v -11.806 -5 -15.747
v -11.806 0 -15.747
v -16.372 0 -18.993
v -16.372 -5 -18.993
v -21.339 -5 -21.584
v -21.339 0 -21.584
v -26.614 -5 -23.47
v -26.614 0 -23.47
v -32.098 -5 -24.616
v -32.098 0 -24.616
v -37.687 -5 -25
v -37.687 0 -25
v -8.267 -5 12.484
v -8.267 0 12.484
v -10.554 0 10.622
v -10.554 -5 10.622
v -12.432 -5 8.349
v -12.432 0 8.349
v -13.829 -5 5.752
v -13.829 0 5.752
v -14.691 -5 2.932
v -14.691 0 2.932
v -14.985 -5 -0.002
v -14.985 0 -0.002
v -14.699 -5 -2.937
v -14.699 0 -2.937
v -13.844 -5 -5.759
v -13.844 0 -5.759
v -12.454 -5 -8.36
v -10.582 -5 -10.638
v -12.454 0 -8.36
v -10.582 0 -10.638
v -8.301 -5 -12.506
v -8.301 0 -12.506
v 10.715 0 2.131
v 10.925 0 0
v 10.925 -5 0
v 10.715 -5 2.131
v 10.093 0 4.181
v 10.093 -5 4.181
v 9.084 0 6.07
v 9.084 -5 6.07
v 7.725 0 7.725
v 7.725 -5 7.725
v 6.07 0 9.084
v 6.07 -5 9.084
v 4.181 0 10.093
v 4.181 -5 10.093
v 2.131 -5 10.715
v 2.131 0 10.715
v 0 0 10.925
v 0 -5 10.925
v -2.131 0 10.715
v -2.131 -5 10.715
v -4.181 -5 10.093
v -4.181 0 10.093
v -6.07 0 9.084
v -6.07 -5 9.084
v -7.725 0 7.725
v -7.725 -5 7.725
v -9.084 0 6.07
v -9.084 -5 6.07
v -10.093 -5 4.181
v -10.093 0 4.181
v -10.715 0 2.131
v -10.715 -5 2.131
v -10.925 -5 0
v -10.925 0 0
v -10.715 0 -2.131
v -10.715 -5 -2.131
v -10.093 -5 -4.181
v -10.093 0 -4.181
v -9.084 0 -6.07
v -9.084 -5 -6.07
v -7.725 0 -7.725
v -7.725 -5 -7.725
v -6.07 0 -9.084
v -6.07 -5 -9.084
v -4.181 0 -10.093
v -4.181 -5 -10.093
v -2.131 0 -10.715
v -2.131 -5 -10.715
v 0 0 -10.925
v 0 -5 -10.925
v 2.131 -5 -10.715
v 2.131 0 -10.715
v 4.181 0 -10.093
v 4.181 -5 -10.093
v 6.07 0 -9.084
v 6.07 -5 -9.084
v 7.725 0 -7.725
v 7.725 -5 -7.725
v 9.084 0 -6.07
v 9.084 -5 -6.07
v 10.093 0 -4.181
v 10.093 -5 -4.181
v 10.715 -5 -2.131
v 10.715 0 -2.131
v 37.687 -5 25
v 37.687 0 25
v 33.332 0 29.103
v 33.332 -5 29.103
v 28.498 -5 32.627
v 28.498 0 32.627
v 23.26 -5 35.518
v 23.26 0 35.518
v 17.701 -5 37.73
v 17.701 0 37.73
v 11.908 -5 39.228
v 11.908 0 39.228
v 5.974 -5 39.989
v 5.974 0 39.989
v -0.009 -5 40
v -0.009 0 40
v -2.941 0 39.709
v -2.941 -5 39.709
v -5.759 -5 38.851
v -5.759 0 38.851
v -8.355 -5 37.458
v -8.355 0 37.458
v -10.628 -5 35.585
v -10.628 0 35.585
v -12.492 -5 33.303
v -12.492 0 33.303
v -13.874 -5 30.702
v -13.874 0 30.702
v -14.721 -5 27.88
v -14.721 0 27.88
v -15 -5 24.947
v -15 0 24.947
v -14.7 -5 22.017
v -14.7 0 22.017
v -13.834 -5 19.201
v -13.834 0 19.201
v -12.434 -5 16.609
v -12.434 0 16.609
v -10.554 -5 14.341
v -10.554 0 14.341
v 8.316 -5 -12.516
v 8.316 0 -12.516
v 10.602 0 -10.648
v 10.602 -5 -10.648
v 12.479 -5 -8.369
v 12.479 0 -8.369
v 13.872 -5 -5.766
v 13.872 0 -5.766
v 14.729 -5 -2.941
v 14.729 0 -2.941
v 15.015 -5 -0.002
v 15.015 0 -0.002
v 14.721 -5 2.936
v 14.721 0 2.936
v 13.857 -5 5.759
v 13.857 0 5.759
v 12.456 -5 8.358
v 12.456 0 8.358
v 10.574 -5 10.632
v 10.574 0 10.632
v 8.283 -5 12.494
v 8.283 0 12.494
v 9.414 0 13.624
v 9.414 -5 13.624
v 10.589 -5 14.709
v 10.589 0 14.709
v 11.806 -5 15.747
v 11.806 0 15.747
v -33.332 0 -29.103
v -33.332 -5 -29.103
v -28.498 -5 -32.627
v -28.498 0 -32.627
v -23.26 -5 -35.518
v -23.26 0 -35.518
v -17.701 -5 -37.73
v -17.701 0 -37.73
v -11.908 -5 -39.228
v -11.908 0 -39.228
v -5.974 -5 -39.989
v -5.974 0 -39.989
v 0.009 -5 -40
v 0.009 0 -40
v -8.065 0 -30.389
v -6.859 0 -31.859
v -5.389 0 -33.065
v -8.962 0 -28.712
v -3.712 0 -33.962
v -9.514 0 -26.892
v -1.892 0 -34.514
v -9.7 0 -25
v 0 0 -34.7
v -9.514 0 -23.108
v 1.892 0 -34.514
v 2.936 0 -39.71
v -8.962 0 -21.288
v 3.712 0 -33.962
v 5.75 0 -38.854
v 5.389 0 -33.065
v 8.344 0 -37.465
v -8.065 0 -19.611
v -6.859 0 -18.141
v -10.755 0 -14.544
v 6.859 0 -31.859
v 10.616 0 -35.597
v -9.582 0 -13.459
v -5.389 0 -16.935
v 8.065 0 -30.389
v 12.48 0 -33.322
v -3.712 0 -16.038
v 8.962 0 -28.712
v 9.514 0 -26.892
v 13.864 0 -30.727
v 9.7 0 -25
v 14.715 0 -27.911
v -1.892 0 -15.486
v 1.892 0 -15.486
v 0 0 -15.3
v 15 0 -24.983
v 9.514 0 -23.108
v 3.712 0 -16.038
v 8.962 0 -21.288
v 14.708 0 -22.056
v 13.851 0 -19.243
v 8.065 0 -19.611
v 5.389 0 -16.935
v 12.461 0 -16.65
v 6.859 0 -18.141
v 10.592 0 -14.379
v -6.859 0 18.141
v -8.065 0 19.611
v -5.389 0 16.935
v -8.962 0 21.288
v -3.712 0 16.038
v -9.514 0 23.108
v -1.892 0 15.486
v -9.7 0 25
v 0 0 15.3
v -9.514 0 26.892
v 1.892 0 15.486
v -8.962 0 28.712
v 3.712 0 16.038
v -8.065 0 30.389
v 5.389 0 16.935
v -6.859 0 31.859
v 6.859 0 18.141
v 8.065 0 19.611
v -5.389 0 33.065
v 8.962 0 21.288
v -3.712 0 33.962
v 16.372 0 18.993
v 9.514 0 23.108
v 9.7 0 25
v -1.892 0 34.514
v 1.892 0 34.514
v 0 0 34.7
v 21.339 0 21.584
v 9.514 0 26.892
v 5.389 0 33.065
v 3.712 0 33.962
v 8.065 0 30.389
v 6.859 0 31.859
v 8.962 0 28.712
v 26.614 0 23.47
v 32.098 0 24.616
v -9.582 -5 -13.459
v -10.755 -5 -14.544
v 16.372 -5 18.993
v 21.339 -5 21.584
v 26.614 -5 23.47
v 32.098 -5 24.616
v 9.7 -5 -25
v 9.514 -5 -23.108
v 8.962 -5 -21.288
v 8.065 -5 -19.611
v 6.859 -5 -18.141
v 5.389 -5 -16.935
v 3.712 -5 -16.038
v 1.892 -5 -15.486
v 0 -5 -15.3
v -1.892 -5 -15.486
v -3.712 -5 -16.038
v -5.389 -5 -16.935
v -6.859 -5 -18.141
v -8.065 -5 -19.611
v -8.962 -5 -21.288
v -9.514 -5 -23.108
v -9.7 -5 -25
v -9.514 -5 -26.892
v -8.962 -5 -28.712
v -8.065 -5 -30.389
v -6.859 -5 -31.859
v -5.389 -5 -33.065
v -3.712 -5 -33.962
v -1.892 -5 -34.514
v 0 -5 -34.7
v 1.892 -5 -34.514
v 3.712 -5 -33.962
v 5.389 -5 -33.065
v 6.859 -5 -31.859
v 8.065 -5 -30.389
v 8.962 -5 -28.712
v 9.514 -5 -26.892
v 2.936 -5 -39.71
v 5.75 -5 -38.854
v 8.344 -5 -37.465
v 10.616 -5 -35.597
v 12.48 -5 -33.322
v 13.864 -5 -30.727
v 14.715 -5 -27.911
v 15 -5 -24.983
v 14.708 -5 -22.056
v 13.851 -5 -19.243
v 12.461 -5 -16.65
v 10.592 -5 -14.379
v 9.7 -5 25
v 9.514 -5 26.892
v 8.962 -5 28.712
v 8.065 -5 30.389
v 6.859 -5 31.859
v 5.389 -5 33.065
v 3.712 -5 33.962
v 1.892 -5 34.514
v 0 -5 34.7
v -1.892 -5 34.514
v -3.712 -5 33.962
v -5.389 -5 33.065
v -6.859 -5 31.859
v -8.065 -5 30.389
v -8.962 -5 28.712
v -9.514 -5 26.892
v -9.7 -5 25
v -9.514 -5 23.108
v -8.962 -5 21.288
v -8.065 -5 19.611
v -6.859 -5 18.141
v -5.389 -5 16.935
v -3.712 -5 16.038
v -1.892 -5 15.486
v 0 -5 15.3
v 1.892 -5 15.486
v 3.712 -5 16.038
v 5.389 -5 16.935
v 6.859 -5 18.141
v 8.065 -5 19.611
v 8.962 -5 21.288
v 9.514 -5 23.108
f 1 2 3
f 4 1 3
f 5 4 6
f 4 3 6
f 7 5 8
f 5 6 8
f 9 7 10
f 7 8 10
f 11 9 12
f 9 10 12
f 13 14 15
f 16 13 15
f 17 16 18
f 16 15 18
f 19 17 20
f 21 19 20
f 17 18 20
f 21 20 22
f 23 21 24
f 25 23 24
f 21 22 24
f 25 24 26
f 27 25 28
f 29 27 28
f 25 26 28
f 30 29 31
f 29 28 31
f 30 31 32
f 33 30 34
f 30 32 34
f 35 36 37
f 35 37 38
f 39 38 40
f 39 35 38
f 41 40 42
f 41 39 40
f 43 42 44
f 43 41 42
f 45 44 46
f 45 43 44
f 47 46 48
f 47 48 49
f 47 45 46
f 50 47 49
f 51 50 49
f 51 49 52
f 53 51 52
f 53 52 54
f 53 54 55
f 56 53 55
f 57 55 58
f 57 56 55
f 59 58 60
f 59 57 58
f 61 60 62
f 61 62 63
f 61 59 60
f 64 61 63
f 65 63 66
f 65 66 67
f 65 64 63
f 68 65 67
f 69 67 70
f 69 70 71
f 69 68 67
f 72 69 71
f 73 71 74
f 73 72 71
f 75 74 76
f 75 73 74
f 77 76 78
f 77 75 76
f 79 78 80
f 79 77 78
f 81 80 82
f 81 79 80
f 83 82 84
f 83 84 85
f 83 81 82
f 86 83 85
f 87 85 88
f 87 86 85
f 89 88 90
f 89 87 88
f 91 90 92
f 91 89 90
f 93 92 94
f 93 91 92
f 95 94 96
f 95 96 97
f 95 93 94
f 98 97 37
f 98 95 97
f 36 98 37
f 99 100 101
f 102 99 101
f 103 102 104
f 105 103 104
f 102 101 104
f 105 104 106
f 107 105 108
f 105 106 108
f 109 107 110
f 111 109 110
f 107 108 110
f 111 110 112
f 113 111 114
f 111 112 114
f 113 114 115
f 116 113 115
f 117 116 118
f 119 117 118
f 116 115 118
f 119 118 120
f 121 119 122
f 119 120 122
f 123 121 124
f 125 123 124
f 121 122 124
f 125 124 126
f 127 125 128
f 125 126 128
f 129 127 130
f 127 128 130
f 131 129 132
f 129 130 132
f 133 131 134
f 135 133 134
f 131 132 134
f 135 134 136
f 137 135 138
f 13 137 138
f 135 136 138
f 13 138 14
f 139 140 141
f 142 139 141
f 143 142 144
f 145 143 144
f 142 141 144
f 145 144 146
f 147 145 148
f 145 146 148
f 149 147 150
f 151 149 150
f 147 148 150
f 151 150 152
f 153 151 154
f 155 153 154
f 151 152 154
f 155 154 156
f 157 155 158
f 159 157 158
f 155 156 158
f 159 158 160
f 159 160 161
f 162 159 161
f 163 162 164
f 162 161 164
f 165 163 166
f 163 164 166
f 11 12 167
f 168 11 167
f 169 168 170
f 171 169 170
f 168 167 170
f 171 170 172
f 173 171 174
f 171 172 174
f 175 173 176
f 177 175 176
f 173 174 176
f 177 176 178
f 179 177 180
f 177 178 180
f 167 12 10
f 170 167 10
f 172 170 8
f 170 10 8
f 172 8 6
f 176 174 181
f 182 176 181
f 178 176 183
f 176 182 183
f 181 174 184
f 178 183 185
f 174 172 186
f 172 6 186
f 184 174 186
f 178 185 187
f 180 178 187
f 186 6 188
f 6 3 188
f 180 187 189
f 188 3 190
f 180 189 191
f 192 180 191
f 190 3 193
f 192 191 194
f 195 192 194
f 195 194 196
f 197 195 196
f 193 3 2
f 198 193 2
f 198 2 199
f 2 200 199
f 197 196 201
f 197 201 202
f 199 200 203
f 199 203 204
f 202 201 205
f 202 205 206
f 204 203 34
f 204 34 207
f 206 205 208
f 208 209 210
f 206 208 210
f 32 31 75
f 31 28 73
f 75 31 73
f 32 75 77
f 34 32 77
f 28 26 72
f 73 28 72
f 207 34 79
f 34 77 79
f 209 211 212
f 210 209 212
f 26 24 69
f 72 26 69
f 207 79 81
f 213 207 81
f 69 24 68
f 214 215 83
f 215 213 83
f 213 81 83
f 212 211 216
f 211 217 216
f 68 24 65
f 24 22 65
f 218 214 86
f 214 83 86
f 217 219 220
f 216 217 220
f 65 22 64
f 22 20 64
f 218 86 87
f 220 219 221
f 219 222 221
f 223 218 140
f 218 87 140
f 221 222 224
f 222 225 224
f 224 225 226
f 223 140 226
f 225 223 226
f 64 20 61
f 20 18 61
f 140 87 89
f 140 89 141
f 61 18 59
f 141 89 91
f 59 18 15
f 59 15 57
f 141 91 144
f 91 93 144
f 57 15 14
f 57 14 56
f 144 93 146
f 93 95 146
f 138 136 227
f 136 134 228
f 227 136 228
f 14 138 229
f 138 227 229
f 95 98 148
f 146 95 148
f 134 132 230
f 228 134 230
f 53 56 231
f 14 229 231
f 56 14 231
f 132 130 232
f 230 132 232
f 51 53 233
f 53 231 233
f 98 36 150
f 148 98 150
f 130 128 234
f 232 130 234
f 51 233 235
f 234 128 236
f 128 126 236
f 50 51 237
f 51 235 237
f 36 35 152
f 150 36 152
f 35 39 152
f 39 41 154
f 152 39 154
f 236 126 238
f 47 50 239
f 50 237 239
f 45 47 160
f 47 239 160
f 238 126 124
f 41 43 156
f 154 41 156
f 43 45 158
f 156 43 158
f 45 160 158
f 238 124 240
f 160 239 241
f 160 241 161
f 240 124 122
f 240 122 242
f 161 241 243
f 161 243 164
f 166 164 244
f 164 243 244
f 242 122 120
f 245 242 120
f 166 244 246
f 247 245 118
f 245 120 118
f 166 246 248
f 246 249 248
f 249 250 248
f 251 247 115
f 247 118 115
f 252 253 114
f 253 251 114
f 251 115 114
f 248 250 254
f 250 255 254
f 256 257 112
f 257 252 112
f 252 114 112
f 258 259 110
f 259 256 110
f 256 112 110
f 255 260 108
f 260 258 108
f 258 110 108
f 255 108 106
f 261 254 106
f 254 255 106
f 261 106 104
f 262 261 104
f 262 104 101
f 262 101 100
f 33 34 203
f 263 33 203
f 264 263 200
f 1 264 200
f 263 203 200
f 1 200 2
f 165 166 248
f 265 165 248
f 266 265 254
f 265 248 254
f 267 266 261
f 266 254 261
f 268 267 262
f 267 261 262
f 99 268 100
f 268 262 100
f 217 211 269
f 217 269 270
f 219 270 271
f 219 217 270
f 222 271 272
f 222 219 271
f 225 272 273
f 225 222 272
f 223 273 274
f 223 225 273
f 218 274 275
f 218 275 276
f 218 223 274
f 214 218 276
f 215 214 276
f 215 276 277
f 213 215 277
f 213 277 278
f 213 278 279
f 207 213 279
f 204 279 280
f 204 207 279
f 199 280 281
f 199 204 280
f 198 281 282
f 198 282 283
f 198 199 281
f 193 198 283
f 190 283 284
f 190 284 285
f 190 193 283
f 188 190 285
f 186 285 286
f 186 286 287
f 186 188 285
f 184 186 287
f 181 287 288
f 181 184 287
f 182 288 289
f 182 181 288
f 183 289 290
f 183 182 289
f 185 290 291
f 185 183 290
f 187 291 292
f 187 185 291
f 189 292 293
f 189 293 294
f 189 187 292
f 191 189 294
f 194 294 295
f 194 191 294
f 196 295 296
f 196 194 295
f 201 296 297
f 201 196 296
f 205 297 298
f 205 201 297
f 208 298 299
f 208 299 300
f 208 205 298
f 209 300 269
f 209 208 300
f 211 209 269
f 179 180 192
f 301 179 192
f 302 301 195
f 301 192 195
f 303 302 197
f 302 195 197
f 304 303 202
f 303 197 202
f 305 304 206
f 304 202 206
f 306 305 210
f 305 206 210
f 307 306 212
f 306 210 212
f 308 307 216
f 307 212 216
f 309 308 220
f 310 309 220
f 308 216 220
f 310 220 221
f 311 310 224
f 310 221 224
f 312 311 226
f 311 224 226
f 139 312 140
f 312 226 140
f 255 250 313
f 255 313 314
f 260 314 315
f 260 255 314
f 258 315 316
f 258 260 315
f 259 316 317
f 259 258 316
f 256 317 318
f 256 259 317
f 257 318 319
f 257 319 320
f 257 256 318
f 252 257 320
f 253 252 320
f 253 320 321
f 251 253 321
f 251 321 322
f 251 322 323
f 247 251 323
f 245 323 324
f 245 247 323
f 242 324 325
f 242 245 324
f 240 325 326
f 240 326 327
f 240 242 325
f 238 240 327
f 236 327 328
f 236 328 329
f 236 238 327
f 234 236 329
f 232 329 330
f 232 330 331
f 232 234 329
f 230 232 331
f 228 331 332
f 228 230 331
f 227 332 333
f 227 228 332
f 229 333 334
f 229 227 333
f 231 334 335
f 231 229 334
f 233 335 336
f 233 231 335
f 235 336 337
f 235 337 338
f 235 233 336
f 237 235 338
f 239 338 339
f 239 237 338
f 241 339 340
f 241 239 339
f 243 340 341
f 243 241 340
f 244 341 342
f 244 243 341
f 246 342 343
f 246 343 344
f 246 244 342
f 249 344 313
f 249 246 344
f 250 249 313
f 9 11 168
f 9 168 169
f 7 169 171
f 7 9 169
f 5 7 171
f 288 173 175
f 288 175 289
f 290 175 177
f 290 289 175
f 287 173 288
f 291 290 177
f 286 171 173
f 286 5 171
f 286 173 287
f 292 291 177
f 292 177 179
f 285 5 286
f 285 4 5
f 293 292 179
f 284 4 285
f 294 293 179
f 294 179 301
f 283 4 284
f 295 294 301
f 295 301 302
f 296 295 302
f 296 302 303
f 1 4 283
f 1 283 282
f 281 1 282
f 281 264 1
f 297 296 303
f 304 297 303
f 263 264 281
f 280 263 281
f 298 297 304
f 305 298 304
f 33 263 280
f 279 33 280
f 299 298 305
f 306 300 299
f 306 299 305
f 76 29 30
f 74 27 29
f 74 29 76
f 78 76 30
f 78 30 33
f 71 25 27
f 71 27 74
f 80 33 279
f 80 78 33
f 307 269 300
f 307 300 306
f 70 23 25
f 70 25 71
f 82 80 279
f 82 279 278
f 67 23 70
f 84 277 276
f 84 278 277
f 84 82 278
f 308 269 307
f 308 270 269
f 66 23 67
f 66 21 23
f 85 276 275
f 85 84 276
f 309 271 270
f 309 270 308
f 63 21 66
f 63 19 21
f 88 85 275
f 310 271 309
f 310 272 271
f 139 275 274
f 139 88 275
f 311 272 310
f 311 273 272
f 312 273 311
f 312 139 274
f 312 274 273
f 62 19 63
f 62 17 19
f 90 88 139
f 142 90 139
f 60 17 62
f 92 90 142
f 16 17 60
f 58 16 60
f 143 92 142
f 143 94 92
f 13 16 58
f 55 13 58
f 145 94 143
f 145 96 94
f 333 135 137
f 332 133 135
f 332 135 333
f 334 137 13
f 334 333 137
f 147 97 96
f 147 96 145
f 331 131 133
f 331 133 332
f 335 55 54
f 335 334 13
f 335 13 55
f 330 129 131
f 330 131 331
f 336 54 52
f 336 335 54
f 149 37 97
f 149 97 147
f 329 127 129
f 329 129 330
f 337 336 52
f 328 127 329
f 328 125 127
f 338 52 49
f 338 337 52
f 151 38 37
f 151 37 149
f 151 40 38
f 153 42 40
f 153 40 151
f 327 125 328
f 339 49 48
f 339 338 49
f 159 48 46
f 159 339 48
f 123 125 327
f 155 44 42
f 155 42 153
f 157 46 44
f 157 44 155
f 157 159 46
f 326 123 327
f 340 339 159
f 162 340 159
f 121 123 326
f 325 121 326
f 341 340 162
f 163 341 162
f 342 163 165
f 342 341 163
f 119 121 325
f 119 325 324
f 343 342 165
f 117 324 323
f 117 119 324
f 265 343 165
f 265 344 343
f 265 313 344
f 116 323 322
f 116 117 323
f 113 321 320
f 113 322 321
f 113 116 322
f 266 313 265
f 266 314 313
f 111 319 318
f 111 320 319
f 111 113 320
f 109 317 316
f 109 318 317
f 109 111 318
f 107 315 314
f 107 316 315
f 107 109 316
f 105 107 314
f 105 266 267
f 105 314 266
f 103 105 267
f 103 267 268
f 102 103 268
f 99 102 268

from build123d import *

# Parameters (mm, degrees)
F0_R     = 9.7
F0_R_2   = 10.925
F1_DEPTH = 5


with BuildPart() as f1:
    # F0 (on Front) → F1 (new body)
    with BuildSketch(Plane.XZ):
        with BuildLine():
            ThreePointArc((8.31589, -12.516171), (15.015347, -0.00212), (8.282537, 12.494018))
            ThreePointArc((8.282537, 12.494018), (9.996409, 14.172211), (11.805892, 15.746843))
            ThreePointArc((11.805892, 15.746843), (23.94425, 22.617165), (37.687, 25))
            ThreePointArc((37.687, 25), (20.514782, 36.711637), (-0.009208, 39.999997))
            ThreePointArc((-0.009208, 39.999997), (-14.366945, 29.311716), (-8.267176, 12.483858))
            ThreePointArc((-8.267176, 12.483858), (-14.984626, -0.002104), (-8.300529, -12.505953))
            ThreePointArc((-8.300529, -12.505953), (-10.18297, -13.986049), (-11.805892, -15.746843))
            ThreePointArc((-11.805892, -15.746843), (-23.94425, -22.617165), (-37.687, -25))
            ThreePointArc((-37.687, -25), (-20.514782, -36.711637), (0.009208, -39.999997))
            ThreePointArc((0.009208, -39.999997), (14.358516, -29.339702), (8.31589, -12.516171))
        make_face()
        with Locations((0, -25)):
            Circle(F0_R, mode=Mode.SUBTRACT)
        Circle(F0_R_2, mode=Mode.SUBTRACT)
        with Locations((0, 25)):
            Circle(F0_R, mode=Mode.SUBTRACT)
    extrude(amount=F1_DEPTH)


solid = f1.part
